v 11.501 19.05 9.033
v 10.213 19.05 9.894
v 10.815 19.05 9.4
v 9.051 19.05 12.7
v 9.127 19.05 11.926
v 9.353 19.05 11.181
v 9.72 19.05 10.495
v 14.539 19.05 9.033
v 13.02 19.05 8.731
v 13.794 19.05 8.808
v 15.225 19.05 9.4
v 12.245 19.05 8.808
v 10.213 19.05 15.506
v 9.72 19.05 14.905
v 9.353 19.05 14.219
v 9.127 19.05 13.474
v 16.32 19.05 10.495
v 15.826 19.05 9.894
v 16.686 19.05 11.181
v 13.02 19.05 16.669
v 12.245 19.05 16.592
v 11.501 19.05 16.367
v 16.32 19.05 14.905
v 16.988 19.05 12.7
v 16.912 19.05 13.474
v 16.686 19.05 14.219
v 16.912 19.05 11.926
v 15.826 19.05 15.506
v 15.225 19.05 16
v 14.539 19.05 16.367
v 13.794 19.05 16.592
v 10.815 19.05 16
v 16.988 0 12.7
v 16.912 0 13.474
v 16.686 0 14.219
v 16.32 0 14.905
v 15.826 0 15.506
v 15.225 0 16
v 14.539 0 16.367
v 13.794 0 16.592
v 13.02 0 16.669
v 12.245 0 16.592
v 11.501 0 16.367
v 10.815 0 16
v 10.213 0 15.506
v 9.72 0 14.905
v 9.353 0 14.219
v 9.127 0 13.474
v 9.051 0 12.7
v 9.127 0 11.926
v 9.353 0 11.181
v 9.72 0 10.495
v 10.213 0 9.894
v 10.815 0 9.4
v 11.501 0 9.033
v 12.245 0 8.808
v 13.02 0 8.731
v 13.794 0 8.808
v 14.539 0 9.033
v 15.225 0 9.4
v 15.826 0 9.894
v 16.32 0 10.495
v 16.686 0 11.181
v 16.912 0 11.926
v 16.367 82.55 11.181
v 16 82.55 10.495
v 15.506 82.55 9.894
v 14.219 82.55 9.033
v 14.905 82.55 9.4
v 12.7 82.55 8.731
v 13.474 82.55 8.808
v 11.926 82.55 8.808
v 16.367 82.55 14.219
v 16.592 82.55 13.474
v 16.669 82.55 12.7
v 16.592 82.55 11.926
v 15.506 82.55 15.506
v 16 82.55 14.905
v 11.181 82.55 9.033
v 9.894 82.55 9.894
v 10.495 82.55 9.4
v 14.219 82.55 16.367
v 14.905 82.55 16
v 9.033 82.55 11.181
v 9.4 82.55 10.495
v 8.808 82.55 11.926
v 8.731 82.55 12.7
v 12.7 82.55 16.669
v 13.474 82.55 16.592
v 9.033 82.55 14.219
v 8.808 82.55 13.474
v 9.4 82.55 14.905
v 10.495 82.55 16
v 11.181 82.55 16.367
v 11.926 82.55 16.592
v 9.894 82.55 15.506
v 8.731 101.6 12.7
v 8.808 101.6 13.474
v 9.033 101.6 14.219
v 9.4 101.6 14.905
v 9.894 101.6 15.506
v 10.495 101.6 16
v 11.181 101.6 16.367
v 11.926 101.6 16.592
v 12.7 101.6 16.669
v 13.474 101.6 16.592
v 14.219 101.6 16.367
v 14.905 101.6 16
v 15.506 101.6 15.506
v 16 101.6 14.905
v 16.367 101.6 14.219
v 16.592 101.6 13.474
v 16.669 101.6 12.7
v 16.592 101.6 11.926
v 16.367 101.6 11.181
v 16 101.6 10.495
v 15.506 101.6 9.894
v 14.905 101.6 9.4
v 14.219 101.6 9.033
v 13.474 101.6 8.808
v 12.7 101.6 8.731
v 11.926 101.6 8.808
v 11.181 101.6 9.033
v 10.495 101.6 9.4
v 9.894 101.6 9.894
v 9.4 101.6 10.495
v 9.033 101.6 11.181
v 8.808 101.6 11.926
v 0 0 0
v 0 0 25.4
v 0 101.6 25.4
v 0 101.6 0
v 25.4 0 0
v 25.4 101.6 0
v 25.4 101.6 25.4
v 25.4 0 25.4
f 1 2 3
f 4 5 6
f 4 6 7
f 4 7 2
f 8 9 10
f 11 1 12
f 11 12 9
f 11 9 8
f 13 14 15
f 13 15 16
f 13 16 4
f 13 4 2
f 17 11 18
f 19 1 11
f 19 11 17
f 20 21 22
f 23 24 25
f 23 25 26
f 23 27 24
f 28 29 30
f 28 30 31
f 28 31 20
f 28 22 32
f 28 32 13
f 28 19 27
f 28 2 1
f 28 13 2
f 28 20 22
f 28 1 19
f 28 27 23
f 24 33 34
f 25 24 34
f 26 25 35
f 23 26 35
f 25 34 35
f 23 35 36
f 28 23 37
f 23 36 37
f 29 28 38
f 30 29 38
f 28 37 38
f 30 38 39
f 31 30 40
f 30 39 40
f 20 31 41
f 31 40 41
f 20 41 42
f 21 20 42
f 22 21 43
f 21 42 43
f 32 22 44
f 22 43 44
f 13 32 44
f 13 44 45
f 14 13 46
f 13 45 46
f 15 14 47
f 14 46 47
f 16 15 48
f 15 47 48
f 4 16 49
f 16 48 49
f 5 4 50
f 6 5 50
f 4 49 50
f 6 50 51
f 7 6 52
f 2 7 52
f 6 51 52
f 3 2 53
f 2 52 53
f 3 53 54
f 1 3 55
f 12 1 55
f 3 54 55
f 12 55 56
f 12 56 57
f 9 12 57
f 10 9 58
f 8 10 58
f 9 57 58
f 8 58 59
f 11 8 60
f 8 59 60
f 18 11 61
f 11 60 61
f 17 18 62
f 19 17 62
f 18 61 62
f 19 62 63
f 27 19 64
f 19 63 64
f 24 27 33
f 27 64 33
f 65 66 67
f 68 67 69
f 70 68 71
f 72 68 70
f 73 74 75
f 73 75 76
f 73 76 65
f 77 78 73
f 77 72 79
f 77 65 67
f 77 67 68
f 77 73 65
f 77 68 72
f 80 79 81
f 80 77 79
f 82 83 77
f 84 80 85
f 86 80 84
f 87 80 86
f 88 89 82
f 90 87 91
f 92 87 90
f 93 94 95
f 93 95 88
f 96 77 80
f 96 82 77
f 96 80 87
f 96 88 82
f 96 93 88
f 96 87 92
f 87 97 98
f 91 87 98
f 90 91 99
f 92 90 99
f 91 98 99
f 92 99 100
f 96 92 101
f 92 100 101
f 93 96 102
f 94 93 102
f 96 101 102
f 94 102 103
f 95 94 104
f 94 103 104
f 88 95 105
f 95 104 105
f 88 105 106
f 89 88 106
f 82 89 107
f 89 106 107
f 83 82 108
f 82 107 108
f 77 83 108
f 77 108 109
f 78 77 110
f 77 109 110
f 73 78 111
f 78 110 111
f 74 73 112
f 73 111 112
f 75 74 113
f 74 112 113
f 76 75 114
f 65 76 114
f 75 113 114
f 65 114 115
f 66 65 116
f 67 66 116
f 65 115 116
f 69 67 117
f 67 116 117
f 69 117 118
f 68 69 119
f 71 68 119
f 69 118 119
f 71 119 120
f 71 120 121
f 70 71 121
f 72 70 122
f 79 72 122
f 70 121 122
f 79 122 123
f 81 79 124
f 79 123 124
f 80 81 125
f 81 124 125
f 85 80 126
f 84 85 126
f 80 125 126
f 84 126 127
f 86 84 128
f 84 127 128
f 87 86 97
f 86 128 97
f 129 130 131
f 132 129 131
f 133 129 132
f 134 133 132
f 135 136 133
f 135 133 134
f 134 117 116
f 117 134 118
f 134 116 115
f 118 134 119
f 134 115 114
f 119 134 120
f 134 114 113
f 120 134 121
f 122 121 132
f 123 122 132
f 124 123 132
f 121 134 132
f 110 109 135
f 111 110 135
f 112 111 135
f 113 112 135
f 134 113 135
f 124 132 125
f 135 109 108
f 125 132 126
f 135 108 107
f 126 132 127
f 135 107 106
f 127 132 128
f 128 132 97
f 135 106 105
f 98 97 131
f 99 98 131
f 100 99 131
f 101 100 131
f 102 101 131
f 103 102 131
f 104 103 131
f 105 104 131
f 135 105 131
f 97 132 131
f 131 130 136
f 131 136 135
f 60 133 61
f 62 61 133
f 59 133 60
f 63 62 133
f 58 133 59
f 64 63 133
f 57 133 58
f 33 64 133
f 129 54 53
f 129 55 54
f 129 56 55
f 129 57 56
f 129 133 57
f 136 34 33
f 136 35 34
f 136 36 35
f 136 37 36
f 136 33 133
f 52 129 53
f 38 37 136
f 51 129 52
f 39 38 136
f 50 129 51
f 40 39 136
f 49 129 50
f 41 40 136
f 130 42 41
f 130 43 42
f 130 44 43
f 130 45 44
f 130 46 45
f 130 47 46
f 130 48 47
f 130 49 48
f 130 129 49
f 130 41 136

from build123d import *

# Parameters (mm, degrees)
F0_W     = 101.6
F0_H     = 25.4
F1_DEPTH = 25.4
F2_R     = 3.96875
F3_DEPTH = 19.05
F4_R     = 3.96875
F5_DEPTH = 19.05


with BuildPart() as f1:
    # F0 (on Right) → F1 (new body)
    with BuildSketch(Plane.YZ):
        with Locations((50.8, 12.7)):
            Rectangle(F0_W, F0_H)
    extrude(amount=F1_DEPTH)

    # F2 (on face) → F3 (cut)
    with BuildSketch(Plane(origin=(0, 101.6, 0), x_dir=(-1, 0, 0), z_dir=(0, 1, 0))):
        with Locations((-12.7, 12.7)):
            Circle(F2_R)
    extrude(amount=-F3_DEPTH, mode=Mode.SUBTRACT)

    # F4 (on face) → F5 (cut)
    with BuildSketch(Plane.XZ):
        with Locations((13.019745, 12.7)):
            Circle(F4_R)
    extrude(amount=-F5_DEPTH, mode=Mode.SUBTRACT)


solid = f1.part
